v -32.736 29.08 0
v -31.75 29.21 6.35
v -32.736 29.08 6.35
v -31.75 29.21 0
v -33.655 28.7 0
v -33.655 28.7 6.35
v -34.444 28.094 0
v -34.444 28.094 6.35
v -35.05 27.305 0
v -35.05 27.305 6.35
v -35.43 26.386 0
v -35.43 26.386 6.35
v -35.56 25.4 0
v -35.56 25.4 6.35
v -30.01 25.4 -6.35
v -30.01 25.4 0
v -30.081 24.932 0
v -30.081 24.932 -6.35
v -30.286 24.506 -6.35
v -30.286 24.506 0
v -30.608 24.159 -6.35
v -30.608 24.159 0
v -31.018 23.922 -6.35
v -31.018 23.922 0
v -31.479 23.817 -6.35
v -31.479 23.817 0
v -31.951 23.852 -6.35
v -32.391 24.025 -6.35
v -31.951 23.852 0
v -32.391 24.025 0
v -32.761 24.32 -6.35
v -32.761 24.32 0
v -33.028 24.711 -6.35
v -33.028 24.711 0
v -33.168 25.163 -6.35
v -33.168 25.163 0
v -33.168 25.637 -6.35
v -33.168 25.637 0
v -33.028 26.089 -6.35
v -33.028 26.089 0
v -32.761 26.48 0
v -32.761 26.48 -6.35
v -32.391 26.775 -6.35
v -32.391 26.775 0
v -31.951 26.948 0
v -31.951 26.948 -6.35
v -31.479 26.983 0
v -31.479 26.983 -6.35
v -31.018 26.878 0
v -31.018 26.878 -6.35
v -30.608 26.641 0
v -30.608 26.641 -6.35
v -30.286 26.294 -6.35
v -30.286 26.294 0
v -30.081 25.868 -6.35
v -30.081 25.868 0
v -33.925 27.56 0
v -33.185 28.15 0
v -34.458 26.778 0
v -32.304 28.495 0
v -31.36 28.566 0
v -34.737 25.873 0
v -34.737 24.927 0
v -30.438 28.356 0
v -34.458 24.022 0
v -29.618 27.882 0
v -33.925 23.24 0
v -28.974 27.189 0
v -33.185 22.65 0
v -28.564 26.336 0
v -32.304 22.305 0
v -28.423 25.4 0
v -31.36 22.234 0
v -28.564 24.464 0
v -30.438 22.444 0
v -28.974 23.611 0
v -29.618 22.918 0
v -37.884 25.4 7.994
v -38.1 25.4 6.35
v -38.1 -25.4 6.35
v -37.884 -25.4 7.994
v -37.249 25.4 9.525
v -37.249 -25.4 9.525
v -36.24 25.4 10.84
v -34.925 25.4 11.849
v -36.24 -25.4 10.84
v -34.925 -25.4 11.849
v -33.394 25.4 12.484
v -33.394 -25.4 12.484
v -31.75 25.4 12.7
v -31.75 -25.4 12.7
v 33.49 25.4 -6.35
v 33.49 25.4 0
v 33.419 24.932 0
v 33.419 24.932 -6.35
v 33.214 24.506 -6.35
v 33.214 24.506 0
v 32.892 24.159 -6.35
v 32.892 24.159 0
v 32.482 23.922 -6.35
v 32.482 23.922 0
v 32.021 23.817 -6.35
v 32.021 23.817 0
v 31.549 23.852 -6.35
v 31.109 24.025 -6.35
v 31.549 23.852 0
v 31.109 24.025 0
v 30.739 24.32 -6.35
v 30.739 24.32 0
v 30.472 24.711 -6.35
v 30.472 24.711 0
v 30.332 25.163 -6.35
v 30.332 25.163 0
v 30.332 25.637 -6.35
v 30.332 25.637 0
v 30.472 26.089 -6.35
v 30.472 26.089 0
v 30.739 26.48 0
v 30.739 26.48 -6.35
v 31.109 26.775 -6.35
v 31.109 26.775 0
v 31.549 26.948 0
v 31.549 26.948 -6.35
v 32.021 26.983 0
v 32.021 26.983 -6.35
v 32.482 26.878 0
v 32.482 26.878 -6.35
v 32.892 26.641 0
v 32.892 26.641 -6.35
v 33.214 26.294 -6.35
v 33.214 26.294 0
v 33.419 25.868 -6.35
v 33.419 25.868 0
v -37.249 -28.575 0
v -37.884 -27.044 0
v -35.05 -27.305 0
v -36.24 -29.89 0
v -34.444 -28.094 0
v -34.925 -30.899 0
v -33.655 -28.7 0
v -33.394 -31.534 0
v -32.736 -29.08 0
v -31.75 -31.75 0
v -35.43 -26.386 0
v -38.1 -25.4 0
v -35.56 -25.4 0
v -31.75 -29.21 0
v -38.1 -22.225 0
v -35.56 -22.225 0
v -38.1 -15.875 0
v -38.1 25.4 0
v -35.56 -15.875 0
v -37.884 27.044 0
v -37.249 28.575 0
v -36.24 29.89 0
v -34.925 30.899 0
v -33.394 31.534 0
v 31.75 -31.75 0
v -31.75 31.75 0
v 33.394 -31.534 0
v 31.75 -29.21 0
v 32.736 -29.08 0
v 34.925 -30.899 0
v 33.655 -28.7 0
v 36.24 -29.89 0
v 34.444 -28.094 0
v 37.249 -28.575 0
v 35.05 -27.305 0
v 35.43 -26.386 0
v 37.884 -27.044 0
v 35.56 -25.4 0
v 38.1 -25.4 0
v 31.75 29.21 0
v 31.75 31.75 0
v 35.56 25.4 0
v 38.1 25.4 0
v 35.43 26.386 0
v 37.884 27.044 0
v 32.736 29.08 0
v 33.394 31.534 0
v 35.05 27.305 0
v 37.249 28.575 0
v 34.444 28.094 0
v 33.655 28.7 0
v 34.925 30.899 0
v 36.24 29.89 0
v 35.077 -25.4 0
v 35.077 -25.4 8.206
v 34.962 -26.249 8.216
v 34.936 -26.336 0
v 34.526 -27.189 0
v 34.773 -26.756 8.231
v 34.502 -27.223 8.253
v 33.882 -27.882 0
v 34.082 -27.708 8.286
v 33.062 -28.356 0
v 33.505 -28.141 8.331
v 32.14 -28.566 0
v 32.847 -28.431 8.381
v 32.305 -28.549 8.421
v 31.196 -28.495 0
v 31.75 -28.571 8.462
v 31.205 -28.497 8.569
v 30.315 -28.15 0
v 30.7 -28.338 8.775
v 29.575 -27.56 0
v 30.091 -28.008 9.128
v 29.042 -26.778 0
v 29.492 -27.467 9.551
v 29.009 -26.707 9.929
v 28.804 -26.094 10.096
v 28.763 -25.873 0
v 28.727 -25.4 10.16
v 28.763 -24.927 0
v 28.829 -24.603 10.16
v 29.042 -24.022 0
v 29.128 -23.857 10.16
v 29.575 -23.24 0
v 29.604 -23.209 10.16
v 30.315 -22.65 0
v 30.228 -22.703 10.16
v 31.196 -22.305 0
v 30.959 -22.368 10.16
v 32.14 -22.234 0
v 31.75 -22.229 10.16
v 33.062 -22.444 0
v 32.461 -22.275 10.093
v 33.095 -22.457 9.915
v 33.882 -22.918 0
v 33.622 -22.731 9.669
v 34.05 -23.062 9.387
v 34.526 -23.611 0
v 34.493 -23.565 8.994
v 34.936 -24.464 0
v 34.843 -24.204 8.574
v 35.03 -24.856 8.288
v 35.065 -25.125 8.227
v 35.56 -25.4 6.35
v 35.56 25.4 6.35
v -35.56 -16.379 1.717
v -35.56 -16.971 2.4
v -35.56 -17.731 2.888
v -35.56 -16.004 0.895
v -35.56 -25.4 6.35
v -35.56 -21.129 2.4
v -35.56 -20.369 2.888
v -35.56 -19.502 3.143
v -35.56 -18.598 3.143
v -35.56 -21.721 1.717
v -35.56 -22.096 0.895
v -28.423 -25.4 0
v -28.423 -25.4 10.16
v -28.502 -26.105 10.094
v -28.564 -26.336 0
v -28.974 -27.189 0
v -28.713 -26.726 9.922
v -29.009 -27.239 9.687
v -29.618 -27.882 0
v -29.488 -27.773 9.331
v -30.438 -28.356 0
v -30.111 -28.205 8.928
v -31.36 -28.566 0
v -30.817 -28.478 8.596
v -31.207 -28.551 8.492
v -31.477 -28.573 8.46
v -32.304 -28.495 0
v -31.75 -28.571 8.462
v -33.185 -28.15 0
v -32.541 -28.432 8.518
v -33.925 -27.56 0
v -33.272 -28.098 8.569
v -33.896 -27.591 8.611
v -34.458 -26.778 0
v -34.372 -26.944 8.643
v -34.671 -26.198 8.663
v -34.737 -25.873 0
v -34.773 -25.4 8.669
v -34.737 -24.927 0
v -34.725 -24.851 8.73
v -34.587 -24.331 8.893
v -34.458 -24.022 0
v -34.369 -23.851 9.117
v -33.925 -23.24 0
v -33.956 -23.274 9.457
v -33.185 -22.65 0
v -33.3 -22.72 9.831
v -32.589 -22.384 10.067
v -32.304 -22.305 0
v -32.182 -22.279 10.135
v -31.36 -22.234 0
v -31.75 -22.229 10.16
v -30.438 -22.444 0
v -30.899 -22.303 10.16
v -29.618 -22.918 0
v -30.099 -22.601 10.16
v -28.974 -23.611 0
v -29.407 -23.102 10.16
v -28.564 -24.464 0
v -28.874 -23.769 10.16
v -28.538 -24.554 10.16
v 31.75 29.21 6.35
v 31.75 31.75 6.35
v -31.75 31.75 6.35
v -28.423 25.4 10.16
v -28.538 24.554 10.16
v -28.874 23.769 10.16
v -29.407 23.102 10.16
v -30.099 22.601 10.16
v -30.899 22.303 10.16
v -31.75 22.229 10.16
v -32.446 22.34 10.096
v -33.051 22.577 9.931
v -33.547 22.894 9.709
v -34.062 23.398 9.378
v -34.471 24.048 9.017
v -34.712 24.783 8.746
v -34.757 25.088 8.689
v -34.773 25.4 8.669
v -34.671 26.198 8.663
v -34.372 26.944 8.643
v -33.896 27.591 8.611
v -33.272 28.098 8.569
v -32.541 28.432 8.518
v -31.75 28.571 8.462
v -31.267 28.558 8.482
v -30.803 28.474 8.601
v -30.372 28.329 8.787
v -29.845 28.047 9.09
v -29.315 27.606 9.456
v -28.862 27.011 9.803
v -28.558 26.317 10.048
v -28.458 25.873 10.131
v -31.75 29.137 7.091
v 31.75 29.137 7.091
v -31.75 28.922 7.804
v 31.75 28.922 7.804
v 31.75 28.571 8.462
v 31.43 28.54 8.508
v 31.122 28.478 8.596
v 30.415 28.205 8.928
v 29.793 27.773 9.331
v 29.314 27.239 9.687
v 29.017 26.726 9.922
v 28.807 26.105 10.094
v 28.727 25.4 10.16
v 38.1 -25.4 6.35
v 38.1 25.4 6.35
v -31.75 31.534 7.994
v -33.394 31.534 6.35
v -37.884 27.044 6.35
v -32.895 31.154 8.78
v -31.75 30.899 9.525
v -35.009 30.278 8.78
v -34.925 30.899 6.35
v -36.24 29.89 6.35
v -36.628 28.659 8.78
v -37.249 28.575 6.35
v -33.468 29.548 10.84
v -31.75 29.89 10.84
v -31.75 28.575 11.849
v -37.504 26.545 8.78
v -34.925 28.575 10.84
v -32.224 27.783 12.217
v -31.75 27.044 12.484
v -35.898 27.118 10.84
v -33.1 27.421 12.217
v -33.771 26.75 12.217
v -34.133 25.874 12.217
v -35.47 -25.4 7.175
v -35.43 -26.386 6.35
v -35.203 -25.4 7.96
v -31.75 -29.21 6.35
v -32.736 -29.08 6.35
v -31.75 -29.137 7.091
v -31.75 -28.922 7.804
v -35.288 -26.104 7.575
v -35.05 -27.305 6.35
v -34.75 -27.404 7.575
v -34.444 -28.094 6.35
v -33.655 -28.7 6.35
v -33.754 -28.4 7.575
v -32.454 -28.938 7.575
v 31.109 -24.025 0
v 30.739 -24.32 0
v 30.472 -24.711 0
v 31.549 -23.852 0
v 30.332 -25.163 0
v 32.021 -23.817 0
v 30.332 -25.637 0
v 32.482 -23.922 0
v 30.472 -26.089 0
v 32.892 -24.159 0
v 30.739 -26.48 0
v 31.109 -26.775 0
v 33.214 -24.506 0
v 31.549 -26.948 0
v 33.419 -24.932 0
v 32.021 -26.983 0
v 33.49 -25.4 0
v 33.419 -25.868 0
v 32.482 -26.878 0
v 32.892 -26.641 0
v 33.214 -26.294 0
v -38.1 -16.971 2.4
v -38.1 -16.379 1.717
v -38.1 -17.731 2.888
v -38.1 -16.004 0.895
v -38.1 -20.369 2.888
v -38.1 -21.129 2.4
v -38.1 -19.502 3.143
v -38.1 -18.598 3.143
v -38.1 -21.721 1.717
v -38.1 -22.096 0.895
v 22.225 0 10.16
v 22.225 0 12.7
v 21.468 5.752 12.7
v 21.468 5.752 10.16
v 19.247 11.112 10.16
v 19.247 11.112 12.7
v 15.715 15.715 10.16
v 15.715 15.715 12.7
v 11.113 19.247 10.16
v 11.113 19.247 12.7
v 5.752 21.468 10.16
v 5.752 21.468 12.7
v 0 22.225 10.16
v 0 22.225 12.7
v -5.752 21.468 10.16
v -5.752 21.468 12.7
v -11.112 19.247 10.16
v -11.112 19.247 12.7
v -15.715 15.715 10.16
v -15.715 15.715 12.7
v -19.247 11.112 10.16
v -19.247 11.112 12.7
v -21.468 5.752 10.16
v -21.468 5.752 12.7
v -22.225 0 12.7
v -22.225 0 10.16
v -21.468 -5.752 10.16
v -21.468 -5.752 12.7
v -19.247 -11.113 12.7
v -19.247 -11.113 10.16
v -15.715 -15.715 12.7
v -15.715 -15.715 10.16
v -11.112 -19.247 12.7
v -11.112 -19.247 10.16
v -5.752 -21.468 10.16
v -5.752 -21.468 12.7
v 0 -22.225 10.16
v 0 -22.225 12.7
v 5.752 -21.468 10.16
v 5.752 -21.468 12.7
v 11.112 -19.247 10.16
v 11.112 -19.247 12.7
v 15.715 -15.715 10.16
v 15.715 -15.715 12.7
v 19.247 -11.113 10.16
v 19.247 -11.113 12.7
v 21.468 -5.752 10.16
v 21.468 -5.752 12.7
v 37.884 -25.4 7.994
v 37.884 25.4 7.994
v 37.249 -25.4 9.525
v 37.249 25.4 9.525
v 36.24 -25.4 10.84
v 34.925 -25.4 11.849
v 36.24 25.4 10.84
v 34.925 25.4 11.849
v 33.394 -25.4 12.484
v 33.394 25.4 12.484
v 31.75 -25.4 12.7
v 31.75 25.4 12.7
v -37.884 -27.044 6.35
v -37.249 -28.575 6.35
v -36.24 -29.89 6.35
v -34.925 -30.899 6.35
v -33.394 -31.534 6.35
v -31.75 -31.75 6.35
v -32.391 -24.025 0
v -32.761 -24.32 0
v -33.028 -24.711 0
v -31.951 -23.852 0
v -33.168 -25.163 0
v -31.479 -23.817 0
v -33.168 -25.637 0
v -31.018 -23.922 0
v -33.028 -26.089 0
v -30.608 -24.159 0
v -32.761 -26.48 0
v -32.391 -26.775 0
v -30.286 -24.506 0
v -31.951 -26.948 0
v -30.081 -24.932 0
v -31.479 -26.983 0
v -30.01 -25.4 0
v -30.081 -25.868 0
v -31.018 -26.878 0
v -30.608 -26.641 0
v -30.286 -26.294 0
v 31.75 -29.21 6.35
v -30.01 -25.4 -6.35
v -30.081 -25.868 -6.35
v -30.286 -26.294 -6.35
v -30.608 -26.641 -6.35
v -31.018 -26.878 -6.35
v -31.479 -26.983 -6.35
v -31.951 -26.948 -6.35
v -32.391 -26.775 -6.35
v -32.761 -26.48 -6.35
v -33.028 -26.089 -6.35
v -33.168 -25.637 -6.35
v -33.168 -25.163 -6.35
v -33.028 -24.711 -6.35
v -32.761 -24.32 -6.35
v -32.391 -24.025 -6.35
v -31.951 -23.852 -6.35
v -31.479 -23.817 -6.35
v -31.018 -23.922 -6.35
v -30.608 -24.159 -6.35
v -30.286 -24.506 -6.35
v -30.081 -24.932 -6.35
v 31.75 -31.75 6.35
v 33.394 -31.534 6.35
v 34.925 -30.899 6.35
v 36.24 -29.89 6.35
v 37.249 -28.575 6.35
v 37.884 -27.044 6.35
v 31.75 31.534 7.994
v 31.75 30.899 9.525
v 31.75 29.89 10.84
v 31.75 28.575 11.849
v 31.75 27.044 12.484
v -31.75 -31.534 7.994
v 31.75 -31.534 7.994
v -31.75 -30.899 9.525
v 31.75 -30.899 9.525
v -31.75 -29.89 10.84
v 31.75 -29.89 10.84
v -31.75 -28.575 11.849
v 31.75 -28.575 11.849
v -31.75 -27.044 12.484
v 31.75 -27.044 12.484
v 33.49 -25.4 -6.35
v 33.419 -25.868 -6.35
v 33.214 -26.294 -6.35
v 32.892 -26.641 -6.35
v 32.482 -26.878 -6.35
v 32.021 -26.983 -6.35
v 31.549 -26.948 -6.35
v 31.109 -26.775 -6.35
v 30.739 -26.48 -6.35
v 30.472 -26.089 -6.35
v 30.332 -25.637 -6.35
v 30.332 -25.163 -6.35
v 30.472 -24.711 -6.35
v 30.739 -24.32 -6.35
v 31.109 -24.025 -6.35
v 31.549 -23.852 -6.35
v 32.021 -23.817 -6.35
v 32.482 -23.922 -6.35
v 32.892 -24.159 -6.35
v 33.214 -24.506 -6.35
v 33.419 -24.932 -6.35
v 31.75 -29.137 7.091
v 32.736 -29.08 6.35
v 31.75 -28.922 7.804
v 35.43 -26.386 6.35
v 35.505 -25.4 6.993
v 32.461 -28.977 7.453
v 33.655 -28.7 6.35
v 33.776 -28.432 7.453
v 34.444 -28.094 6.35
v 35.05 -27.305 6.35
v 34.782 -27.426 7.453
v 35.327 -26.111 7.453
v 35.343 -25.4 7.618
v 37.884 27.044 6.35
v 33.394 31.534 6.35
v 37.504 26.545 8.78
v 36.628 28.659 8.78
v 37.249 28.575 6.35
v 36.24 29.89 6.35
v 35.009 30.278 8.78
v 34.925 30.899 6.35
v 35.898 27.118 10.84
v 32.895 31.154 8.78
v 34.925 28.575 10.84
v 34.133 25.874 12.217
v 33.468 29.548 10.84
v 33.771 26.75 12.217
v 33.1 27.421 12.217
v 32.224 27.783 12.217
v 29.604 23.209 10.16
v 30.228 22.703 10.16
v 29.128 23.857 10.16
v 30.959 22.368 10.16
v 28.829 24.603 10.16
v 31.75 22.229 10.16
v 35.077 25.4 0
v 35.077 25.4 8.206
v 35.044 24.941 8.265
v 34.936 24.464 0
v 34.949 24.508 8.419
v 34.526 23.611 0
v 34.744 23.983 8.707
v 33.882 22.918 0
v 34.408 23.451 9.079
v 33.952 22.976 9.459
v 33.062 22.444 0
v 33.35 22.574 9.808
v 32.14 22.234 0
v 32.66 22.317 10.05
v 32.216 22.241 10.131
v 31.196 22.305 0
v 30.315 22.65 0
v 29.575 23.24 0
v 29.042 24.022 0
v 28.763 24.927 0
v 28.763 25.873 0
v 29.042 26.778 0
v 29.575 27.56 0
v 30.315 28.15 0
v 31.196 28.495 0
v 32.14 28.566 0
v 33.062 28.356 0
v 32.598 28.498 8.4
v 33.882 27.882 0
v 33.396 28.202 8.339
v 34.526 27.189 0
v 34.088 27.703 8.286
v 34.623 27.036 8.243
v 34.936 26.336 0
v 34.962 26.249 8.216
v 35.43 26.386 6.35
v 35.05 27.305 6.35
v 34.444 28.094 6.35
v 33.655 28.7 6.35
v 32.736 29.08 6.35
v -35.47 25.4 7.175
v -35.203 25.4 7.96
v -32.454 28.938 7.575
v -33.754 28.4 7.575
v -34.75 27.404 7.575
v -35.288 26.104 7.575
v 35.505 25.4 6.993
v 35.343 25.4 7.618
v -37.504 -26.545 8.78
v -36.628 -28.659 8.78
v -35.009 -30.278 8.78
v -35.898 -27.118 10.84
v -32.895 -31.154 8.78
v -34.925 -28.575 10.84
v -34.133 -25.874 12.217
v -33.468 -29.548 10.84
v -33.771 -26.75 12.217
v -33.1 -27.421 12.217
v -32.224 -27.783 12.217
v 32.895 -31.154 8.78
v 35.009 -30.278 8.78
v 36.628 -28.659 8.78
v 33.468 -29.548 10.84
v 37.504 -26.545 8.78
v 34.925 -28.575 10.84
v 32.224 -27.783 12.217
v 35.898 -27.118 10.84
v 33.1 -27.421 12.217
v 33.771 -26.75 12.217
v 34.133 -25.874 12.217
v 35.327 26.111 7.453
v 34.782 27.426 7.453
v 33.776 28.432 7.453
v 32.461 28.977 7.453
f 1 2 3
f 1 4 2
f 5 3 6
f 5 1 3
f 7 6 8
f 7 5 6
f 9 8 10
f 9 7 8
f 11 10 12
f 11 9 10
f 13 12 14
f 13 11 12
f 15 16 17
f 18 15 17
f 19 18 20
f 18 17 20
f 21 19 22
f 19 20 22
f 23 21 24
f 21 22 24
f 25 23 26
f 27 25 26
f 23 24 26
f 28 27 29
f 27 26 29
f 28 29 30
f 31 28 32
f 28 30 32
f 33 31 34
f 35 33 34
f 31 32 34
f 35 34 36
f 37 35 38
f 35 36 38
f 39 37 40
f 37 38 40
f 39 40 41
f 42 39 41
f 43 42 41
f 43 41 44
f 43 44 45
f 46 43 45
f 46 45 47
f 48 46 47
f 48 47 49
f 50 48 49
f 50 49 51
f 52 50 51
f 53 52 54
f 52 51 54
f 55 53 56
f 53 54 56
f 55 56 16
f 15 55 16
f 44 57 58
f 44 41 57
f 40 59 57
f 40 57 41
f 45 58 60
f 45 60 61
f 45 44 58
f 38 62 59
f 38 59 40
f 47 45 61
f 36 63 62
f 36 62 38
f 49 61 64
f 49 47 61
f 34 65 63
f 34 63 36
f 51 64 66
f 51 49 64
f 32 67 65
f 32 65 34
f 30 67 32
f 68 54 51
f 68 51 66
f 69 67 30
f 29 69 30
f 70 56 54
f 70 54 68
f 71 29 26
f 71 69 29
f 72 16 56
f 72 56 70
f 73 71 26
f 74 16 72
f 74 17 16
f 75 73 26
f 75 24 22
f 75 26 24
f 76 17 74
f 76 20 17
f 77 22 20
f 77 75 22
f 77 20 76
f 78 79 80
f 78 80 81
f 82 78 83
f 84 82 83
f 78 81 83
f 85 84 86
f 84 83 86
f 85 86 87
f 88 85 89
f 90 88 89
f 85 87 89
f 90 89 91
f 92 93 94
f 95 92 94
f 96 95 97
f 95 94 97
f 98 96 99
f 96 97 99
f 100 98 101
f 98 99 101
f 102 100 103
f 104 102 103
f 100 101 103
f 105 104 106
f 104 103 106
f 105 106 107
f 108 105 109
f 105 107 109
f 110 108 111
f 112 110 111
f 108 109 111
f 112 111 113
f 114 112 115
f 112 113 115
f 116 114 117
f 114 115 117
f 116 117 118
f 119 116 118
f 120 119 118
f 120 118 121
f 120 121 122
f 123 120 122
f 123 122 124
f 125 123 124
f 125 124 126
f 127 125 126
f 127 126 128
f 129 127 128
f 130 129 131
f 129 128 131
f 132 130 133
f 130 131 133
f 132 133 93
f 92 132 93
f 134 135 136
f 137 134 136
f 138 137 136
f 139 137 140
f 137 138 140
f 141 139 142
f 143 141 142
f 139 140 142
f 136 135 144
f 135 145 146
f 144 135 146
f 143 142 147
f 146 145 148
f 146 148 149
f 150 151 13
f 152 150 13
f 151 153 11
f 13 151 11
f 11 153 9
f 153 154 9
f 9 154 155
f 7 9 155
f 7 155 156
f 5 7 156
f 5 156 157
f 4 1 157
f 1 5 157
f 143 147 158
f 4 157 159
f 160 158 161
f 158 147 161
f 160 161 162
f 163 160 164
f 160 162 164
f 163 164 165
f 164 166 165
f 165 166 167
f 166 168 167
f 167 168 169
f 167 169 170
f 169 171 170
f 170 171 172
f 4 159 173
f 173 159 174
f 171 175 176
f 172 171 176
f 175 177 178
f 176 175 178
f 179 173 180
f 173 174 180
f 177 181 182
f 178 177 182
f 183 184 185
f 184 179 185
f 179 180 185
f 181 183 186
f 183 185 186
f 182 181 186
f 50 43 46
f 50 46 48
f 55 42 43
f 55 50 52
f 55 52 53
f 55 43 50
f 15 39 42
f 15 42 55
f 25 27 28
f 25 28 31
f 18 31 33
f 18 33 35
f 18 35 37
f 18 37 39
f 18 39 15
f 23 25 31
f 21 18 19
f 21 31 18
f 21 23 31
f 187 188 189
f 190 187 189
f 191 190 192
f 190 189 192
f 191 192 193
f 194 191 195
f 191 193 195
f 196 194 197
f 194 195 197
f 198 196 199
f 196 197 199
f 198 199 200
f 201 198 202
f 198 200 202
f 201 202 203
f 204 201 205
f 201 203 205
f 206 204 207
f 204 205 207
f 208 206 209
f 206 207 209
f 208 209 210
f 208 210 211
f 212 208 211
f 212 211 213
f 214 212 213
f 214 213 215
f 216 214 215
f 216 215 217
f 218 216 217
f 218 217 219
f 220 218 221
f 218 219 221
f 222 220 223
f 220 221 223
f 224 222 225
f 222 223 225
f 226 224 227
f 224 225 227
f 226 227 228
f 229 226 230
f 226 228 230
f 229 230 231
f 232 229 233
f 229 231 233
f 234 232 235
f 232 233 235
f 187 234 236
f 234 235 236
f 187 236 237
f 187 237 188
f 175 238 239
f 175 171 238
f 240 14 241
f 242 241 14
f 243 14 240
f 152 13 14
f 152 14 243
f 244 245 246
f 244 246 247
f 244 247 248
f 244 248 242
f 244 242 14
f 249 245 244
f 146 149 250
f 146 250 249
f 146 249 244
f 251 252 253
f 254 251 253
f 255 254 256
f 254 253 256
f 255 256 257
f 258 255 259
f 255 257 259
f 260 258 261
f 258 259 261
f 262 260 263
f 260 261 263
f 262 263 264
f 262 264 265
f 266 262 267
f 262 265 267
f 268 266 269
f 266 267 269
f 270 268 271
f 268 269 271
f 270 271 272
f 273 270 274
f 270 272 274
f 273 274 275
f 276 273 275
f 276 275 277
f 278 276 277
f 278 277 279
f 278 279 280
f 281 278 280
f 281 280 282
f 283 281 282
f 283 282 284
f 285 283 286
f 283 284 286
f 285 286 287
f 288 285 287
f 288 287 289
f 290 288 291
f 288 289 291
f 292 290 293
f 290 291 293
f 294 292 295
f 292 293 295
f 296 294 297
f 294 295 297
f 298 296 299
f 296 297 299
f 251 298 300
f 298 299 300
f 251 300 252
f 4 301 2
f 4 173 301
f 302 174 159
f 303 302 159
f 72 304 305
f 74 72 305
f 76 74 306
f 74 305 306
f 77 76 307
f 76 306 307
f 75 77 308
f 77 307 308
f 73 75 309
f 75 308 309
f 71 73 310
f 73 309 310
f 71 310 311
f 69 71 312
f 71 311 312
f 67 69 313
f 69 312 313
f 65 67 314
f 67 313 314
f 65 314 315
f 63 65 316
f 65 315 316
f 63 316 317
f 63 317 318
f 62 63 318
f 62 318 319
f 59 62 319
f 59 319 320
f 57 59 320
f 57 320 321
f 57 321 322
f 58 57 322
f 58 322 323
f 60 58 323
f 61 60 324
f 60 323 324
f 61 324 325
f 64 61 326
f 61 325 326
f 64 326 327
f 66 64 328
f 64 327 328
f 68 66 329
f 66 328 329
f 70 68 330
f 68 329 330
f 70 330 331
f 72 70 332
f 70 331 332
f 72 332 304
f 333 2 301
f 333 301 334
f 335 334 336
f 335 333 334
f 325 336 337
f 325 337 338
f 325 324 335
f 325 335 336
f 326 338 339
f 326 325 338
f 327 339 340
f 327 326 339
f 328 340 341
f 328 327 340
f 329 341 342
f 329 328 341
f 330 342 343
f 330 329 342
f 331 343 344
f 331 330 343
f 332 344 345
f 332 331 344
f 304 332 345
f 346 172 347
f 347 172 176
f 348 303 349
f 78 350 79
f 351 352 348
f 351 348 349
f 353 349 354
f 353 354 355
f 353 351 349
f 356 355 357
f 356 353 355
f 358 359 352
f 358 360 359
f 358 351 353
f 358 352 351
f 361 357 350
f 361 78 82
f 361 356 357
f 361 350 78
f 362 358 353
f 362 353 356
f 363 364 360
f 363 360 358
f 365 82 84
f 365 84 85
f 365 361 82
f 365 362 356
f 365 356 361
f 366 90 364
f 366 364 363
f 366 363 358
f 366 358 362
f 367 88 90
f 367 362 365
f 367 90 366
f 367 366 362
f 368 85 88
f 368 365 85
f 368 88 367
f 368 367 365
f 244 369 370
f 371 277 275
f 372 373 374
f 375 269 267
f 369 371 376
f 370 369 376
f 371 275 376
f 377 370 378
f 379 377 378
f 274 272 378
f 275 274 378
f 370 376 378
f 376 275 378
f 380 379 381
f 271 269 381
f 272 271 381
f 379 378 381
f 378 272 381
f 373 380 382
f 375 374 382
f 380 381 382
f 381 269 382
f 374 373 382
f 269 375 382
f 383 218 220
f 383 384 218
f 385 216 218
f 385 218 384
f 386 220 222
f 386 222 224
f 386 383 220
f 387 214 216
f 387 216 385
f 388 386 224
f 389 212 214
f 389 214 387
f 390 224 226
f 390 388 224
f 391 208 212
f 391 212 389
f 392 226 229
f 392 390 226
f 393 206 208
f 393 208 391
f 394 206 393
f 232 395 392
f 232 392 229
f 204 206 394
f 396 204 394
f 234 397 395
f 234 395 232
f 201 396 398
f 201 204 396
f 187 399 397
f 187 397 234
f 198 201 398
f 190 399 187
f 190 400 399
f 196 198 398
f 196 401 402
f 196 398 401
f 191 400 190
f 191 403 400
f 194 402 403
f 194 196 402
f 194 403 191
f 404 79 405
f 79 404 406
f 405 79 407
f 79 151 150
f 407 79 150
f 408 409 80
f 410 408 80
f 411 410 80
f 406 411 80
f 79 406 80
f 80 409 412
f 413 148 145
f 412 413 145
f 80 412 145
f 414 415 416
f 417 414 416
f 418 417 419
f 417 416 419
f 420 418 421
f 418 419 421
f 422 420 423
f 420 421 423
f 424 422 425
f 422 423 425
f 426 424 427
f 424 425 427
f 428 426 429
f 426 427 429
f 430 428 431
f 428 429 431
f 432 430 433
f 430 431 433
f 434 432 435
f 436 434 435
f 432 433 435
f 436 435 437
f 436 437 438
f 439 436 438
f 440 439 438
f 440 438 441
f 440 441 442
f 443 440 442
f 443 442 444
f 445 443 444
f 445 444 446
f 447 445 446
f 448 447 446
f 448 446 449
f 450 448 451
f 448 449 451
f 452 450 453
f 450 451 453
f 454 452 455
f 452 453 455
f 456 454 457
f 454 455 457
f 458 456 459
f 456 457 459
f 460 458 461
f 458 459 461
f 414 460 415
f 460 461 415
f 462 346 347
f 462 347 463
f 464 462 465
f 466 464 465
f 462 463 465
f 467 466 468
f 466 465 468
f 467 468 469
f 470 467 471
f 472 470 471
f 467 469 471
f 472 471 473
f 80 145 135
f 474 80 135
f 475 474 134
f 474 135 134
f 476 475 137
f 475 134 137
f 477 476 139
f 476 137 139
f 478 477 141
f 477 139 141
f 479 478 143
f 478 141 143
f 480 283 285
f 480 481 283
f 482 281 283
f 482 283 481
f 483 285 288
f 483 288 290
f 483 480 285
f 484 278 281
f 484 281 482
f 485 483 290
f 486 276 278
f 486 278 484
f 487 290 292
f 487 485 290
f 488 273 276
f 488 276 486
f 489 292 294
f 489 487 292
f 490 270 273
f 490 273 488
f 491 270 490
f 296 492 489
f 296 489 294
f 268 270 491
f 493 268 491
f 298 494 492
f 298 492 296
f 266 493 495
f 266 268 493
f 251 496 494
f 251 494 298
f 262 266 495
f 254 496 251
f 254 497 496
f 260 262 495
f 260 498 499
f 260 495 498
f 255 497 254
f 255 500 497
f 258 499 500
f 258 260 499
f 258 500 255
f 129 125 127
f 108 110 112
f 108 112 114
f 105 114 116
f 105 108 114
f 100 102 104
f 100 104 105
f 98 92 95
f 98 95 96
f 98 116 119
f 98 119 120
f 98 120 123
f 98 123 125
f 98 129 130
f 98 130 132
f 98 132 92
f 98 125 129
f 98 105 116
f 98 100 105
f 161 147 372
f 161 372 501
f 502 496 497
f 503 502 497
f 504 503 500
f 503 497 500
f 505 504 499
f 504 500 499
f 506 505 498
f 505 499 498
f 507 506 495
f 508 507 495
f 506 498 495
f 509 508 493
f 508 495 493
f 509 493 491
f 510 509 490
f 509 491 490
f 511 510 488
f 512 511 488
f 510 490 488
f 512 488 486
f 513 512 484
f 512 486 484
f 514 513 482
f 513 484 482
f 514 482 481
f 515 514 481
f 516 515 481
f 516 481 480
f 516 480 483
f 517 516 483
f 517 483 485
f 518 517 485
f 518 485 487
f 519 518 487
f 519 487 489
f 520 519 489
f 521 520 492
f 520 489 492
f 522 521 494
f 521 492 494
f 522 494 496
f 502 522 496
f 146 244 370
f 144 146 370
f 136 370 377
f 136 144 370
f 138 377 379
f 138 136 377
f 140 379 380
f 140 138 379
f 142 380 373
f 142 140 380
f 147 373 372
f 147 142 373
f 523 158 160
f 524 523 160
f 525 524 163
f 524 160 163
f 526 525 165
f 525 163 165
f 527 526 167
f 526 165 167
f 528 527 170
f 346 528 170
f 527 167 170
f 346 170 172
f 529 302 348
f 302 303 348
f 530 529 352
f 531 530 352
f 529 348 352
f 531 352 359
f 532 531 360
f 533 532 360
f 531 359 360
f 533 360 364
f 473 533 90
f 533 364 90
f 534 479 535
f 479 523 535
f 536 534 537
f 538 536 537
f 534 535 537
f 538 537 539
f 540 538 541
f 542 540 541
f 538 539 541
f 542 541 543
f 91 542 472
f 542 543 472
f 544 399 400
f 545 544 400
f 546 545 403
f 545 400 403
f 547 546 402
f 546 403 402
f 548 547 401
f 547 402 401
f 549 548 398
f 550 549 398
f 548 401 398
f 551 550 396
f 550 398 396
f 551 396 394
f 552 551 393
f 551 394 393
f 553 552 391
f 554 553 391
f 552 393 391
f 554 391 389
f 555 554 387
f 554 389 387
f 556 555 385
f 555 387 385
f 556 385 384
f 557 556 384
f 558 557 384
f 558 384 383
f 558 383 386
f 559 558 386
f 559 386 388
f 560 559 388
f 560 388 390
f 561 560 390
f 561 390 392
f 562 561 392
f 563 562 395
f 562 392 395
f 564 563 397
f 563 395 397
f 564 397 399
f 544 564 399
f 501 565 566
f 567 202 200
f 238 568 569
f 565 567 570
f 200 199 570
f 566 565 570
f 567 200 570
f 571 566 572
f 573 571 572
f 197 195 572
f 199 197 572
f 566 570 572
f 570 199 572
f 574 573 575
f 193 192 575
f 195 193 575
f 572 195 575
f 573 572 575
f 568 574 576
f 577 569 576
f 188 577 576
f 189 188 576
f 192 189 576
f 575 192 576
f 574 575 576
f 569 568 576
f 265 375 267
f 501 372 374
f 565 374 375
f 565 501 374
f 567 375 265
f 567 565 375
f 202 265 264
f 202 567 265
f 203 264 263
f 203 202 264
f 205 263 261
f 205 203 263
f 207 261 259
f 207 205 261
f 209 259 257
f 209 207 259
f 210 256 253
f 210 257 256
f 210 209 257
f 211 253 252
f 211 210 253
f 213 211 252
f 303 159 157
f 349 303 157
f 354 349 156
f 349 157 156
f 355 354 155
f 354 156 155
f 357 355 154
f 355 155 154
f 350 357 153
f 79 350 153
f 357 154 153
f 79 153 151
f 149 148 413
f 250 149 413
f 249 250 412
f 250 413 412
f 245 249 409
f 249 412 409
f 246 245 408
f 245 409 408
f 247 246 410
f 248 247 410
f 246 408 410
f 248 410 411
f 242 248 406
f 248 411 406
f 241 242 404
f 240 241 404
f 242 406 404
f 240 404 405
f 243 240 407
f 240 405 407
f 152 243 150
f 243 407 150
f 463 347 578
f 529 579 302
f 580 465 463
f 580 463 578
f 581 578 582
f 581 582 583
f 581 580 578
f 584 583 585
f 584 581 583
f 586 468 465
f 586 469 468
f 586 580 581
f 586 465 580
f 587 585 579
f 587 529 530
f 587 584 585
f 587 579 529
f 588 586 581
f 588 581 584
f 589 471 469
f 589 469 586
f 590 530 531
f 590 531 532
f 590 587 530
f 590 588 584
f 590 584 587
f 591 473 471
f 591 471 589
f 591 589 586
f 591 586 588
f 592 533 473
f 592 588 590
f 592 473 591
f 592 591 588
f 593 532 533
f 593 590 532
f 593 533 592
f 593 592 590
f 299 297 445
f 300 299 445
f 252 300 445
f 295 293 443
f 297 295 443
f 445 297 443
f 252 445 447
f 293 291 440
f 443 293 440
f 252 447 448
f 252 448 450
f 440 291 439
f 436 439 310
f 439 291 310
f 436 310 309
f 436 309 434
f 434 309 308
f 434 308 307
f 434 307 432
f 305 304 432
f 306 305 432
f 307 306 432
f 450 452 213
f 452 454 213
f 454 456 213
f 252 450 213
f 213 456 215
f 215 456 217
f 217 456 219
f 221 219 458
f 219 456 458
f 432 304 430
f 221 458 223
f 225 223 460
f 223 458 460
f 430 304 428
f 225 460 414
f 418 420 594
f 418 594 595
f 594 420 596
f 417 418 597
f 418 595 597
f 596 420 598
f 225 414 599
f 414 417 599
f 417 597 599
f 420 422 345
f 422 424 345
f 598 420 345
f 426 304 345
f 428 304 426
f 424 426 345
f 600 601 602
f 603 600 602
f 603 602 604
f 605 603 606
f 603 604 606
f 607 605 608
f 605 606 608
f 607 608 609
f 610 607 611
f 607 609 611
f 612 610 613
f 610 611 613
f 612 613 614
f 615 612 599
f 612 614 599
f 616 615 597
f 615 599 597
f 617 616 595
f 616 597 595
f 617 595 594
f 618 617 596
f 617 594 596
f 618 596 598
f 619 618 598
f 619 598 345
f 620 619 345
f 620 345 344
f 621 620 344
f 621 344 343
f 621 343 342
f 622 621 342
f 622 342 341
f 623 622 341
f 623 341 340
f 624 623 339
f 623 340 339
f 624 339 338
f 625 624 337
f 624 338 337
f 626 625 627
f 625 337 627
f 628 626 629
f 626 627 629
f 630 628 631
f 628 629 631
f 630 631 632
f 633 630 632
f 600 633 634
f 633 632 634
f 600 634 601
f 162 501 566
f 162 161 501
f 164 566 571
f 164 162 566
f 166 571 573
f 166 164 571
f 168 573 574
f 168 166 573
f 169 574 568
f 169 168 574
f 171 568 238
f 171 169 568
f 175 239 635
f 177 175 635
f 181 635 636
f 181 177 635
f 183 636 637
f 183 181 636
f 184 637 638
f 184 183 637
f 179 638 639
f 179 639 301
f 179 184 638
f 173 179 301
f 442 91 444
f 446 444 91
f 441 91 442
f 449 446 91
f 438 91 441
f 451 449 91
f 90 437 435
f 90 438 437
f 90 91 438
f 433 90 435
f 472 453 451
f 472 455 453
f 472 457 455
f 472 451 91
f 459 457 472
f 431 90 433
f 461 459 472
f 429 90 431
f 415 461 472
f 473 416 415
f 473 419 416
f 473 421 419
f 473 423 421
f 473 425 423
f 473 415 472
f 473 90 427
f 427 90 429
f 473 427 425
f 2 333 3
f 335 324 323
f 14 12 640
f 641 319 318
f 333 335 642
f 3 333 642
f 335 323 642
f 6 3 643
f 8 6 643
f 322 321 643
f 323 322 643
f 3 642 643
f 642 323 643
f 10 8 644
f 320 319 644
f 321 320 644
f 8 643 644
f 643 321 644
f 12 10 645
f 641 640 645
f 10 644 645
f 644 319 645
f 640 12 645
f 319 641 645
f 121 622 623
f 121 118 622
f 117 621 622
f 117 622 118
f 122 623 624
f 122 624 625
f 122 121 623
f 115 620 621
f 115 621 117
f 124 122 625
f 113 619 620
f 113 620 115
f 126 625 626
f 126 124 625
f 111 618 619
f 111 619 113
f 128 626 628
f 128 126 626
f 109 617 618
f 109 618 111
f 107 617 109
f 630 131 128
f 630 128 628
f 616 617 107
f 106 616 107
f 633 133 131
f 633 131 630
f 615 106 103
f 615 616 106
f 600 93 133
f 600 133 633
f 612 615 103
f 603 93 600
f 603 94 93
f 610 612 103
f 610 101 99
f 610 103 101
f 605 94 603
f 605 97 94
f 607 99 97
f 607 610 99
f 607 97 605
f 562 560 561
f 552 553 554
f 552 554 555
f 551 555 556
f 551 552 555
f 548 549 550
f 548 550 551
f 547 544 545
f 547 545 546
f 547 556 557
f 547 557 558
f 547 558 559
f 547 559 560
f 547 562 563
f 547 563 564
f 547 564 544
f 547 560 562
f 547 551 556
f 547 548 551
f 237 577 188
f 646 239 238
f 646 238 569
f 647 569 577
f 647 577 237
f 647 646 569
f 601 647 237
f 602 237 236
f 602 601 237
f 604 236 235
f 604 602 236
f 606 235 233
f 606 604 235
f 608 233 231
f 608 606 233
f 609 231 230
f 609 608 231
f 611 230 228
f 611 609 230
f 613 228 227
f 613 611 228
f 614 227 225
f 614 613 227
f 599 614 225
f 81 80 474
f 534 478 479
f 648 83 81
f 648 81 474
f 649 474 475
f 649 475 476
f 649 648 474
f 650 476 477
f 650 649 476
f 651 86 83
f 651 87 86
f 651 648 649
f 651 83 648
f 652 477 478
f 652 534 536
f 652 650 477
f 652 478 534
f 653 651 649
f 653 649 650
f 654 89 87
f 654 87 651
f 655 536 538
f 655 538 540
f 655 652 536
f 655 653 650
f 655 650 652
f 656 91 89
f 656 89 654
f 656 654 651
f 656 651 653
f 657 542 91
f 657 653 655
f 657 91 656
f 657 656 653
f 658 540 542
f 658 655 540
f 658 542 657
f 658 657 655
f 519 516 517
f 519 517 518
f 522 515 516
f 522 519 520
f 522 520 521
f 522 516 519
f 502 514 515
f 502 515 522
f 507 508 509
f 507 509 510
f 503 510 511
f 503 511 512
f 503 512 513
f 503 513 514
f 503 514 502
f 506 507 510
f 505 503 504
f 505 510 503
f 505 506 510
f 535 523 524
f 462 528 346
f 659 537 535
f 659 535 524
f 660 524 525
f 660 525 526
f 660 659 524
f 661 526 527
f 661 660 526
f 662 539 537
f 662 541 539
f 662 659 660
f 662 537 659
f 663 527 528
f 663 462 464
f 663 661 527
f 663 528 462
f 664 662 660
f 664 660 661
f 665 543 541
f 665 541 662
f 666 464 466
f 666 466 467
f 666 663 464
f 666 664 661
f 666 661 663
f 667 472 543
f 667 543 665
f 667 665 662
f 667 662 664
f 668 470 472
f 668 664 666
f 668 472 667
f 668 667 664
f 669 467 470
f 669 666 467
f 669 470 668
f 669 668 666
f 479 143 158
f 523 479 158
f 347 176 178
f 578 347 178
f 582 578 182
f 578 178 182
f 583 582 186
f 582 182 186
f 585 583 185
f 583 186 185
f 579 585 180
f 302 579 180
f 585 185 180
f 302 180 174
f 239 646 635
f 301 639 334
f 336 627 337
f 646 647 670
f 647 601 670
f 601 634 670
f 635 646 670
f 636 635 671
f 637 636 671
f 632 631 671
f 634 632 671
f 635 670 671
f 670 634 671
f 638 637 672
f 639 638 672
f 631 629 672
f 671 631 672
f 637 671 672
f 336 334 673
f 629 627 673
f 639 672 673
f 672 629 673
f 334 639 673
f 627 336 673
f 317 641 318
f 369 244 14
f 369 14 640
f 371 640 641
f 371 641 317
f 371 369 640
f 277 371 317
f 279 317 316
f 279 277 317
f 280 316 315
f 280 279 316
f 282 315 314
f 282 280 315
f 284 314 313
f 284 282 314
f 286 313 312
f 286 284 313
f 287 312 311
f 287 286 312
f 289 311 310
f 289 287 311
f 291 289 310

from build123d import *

# Parameters (mm, degrees)
F1_DEPTH  = 12.7
F2_R      = 6.35
F3_T      = -2.54
F4_R      = 3.175
F5_DEPTH  = 2.54
F7_R      = 3.175
F8_DEPTH  = 10.16
F9_R      = 1.5875
F10_DEPTH = 6.35
F11_R     = 22.225
F12_DEPTH = 2.54


with BuildPart() as f1:
    # F0 (on Top) → F1 (new body)
    with BuildSketch(Plane.XY):
        with BuildLine():
            Line((-31.75, -31.75), (31.75, -31.75))
            ThreePointArc((31.75, -31.75), (36.2401280605, -29.8901280605), (38.1, -25.4))
            Line((38.1, -25.4), (38.1, 25.4))
            ThreePointArc((38.1, 25.4), (36.2401280605, 29.8901280605), (31.75, 31.75))
            Line((31.75, 31.75), (-31.75, 31.75))
            ThreePointArc((-31.75, 31.75), (-36.2401280605, 29.8901280605), (-38.1, 25.4))
            Line((-38.1, 25.4), (-38.1, -25.4))
            ThreePointArc((-38.1, -25.4), (-36.2401280605, -29.8901280605), (-31.75, -31.75))
        make_face()
    extrude(amount=F1_DEPTH)

    # F2
    f2_edges = [f1.edges().sort_by_distance(p)[0] for p in [
        (0, -31.75, 12.7),
        (36.240128, -29.890128, 12.7),
        (38.1, 0, 12.7),
        (36.240128, 29.890128, 12.7),
        (0, 31.75, 12.7),
        (-36.240128, 29.890128, 12.7),
        (-38.1, 0, 12.7),
        (-36.240128, -29.890128, 12.7),
    ]]
    fillet(f2_edges, radius=F2_R)

    # F3
    f3_openings = [f1.faces().sort_by_distance(p)[0] for p in [
        (0, 0, 0),
    ]]
    offset(amount=F3_T, openings=f3_openings)

    # F4 (on face) → F5 (cut, through all)
    with BuildSketch(Plane(origin=(-38.1, 0, 0), x_dir=(0, -1, 0), z_dir=(-1, 0, 0))):
        with Locations((19.05, 0)):
            Circle(F4_R)
    extrude(amount=-F5_DEPTH, mode=Mode.SUBTRACT)

    # F7 (on offset) → F8 (join, through all)
    with BuildSketch(Plane(origin=(0, 0, 10.16), x_dir=(1, 0, 0), z_dir=(0, 0, -1))):
        with Locations((-31.5977446735, 25.4)):
            Circle(F7_R)
        with Locations((-31.5977446735, -25.4)):
            Circle(F7_R)
        with Locations((31.9022553265, 25.4)):
            Circle(F7_R)
        with Locations((31.9022553265, -25.4)):
            Circle(F7_R)
    extrude(amount=F8_DEPTH)

    # F9 (on face) → F10 (join)
    with BuildSketch(Plane(origin=(0, 0, 0), x_dir=(1, 0, 0), z_dir=(0, 0, -1))):
        with Locations((-31.5977446735, 25.4)):
            Circle(F9_R)
        with Locations((-31.5977446735, -25.4)):
            Circle(F9_R)
        with Locations((31.9022553265, 25.4)):
            Circle(F9_R)
        with Locations((31.9022553265, -25.4)):
            Circle(F9_R)
    extrude(amount=F10_DEPTH)

    # F11 (on face) → F12 (cut, through all)
    with BuildSketch(Plane.XY.offset(12.7)):
        Circle(F11_R)
    extrude(amount=-F12_DEPTH, mode=Mode.SUBTRACT)


solid = f1.part
